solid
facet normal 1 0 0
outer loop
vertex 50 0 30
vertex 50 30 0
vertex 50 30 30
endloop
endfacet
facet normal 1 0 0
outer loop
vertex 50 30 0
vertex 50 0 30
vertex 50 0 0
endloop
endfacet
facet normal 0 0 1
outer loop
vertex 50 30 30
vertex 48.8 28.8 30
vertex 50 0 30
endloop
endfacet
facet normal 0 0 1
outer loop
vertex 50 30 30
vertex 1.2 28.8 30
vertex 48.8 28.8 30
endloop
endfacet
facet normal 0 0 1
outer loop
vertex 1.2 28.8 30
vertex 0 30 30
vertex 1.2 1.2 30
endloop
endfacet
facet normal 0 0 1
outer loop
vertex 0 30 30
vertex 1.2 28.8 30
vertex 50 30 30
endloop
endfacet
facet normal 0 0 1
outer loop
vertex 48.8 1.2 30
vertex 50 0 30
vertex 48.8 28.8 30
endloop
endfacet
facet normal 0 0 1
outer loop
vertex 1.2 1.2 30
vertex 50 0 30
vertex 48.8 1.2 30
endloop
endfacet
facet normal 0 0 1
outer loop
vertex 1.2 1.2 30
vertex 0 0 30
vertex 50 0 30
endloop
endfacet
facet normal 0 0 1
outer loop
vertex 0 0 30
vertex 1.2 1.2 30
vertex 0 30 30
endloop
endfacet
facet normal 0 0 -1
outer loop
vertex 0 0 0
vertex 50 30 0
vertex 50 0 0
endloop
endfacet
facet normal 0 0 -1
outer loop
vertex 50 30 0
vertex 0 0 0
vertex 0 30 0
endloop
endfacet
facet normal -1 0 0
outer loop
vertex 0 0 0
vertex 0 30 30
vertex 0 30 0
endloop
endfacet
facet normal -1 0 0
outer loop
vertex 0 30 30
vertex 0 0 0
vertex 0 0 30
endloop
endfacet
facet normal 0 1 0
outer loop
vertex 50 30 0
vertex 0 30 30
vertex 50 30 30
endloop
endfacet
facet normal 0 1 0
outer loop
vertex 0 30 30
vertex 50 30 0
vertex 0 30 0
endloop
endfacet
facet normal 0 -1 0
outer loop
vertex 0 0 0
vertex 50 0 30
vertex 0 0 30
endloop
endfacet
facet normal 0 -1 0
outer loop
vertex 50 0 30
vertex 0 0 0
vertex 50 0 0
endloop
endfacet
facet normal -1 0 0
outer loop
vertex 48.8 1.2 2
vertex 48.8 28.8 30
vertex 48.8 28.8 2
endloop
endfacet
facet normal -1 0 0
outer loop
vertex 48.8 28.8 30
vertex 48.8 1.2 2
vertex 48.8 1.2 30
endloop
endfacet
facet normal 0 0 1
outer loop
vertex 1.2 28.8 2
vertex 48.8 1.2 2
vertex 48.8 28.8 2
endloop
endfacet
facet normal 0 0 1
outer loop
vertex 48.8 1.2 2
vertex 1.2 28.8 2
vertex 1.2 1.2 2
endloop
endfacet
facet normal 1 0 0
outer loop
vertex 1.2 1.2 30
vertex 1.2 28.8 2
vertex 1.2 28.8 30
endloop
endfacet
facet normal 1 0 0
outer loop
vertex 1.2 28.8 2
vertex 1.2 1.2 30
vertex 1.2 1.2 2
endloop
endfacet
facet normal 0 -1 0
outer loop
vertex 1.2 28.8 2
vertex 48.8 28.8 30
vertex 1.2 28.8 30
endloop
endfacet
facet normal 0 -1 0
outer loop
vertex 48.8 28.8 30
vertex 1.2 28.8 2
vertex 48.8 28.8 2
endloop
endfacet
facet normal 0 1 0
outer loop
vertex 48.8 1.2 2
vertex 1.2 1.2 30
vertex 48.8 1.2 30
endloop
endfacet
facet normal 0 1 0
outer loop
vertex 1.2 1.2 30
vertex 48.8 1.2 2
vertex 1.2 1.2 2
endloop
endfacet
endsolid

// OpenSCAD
$fn = 32;

// ----------------------------------------------------------------------
// Open box: 1.2 mm walls
// ----------------------------------------------------------------------

// --- parameters (mm) ---
box_l = 50;               // outer length, X
box_w = 30;               // outer width, Y
box_h = 30;               // outer height, Z
wall = 1.2;               // wall thickness
floor = 2;                // floor thickness

difference() {
  cube([box_l, box_w, box_h]);
  translate([wall, wall, floor])
    cube([box_l - 2 * wall, box_w - 2 * wall, box_h]);
}
